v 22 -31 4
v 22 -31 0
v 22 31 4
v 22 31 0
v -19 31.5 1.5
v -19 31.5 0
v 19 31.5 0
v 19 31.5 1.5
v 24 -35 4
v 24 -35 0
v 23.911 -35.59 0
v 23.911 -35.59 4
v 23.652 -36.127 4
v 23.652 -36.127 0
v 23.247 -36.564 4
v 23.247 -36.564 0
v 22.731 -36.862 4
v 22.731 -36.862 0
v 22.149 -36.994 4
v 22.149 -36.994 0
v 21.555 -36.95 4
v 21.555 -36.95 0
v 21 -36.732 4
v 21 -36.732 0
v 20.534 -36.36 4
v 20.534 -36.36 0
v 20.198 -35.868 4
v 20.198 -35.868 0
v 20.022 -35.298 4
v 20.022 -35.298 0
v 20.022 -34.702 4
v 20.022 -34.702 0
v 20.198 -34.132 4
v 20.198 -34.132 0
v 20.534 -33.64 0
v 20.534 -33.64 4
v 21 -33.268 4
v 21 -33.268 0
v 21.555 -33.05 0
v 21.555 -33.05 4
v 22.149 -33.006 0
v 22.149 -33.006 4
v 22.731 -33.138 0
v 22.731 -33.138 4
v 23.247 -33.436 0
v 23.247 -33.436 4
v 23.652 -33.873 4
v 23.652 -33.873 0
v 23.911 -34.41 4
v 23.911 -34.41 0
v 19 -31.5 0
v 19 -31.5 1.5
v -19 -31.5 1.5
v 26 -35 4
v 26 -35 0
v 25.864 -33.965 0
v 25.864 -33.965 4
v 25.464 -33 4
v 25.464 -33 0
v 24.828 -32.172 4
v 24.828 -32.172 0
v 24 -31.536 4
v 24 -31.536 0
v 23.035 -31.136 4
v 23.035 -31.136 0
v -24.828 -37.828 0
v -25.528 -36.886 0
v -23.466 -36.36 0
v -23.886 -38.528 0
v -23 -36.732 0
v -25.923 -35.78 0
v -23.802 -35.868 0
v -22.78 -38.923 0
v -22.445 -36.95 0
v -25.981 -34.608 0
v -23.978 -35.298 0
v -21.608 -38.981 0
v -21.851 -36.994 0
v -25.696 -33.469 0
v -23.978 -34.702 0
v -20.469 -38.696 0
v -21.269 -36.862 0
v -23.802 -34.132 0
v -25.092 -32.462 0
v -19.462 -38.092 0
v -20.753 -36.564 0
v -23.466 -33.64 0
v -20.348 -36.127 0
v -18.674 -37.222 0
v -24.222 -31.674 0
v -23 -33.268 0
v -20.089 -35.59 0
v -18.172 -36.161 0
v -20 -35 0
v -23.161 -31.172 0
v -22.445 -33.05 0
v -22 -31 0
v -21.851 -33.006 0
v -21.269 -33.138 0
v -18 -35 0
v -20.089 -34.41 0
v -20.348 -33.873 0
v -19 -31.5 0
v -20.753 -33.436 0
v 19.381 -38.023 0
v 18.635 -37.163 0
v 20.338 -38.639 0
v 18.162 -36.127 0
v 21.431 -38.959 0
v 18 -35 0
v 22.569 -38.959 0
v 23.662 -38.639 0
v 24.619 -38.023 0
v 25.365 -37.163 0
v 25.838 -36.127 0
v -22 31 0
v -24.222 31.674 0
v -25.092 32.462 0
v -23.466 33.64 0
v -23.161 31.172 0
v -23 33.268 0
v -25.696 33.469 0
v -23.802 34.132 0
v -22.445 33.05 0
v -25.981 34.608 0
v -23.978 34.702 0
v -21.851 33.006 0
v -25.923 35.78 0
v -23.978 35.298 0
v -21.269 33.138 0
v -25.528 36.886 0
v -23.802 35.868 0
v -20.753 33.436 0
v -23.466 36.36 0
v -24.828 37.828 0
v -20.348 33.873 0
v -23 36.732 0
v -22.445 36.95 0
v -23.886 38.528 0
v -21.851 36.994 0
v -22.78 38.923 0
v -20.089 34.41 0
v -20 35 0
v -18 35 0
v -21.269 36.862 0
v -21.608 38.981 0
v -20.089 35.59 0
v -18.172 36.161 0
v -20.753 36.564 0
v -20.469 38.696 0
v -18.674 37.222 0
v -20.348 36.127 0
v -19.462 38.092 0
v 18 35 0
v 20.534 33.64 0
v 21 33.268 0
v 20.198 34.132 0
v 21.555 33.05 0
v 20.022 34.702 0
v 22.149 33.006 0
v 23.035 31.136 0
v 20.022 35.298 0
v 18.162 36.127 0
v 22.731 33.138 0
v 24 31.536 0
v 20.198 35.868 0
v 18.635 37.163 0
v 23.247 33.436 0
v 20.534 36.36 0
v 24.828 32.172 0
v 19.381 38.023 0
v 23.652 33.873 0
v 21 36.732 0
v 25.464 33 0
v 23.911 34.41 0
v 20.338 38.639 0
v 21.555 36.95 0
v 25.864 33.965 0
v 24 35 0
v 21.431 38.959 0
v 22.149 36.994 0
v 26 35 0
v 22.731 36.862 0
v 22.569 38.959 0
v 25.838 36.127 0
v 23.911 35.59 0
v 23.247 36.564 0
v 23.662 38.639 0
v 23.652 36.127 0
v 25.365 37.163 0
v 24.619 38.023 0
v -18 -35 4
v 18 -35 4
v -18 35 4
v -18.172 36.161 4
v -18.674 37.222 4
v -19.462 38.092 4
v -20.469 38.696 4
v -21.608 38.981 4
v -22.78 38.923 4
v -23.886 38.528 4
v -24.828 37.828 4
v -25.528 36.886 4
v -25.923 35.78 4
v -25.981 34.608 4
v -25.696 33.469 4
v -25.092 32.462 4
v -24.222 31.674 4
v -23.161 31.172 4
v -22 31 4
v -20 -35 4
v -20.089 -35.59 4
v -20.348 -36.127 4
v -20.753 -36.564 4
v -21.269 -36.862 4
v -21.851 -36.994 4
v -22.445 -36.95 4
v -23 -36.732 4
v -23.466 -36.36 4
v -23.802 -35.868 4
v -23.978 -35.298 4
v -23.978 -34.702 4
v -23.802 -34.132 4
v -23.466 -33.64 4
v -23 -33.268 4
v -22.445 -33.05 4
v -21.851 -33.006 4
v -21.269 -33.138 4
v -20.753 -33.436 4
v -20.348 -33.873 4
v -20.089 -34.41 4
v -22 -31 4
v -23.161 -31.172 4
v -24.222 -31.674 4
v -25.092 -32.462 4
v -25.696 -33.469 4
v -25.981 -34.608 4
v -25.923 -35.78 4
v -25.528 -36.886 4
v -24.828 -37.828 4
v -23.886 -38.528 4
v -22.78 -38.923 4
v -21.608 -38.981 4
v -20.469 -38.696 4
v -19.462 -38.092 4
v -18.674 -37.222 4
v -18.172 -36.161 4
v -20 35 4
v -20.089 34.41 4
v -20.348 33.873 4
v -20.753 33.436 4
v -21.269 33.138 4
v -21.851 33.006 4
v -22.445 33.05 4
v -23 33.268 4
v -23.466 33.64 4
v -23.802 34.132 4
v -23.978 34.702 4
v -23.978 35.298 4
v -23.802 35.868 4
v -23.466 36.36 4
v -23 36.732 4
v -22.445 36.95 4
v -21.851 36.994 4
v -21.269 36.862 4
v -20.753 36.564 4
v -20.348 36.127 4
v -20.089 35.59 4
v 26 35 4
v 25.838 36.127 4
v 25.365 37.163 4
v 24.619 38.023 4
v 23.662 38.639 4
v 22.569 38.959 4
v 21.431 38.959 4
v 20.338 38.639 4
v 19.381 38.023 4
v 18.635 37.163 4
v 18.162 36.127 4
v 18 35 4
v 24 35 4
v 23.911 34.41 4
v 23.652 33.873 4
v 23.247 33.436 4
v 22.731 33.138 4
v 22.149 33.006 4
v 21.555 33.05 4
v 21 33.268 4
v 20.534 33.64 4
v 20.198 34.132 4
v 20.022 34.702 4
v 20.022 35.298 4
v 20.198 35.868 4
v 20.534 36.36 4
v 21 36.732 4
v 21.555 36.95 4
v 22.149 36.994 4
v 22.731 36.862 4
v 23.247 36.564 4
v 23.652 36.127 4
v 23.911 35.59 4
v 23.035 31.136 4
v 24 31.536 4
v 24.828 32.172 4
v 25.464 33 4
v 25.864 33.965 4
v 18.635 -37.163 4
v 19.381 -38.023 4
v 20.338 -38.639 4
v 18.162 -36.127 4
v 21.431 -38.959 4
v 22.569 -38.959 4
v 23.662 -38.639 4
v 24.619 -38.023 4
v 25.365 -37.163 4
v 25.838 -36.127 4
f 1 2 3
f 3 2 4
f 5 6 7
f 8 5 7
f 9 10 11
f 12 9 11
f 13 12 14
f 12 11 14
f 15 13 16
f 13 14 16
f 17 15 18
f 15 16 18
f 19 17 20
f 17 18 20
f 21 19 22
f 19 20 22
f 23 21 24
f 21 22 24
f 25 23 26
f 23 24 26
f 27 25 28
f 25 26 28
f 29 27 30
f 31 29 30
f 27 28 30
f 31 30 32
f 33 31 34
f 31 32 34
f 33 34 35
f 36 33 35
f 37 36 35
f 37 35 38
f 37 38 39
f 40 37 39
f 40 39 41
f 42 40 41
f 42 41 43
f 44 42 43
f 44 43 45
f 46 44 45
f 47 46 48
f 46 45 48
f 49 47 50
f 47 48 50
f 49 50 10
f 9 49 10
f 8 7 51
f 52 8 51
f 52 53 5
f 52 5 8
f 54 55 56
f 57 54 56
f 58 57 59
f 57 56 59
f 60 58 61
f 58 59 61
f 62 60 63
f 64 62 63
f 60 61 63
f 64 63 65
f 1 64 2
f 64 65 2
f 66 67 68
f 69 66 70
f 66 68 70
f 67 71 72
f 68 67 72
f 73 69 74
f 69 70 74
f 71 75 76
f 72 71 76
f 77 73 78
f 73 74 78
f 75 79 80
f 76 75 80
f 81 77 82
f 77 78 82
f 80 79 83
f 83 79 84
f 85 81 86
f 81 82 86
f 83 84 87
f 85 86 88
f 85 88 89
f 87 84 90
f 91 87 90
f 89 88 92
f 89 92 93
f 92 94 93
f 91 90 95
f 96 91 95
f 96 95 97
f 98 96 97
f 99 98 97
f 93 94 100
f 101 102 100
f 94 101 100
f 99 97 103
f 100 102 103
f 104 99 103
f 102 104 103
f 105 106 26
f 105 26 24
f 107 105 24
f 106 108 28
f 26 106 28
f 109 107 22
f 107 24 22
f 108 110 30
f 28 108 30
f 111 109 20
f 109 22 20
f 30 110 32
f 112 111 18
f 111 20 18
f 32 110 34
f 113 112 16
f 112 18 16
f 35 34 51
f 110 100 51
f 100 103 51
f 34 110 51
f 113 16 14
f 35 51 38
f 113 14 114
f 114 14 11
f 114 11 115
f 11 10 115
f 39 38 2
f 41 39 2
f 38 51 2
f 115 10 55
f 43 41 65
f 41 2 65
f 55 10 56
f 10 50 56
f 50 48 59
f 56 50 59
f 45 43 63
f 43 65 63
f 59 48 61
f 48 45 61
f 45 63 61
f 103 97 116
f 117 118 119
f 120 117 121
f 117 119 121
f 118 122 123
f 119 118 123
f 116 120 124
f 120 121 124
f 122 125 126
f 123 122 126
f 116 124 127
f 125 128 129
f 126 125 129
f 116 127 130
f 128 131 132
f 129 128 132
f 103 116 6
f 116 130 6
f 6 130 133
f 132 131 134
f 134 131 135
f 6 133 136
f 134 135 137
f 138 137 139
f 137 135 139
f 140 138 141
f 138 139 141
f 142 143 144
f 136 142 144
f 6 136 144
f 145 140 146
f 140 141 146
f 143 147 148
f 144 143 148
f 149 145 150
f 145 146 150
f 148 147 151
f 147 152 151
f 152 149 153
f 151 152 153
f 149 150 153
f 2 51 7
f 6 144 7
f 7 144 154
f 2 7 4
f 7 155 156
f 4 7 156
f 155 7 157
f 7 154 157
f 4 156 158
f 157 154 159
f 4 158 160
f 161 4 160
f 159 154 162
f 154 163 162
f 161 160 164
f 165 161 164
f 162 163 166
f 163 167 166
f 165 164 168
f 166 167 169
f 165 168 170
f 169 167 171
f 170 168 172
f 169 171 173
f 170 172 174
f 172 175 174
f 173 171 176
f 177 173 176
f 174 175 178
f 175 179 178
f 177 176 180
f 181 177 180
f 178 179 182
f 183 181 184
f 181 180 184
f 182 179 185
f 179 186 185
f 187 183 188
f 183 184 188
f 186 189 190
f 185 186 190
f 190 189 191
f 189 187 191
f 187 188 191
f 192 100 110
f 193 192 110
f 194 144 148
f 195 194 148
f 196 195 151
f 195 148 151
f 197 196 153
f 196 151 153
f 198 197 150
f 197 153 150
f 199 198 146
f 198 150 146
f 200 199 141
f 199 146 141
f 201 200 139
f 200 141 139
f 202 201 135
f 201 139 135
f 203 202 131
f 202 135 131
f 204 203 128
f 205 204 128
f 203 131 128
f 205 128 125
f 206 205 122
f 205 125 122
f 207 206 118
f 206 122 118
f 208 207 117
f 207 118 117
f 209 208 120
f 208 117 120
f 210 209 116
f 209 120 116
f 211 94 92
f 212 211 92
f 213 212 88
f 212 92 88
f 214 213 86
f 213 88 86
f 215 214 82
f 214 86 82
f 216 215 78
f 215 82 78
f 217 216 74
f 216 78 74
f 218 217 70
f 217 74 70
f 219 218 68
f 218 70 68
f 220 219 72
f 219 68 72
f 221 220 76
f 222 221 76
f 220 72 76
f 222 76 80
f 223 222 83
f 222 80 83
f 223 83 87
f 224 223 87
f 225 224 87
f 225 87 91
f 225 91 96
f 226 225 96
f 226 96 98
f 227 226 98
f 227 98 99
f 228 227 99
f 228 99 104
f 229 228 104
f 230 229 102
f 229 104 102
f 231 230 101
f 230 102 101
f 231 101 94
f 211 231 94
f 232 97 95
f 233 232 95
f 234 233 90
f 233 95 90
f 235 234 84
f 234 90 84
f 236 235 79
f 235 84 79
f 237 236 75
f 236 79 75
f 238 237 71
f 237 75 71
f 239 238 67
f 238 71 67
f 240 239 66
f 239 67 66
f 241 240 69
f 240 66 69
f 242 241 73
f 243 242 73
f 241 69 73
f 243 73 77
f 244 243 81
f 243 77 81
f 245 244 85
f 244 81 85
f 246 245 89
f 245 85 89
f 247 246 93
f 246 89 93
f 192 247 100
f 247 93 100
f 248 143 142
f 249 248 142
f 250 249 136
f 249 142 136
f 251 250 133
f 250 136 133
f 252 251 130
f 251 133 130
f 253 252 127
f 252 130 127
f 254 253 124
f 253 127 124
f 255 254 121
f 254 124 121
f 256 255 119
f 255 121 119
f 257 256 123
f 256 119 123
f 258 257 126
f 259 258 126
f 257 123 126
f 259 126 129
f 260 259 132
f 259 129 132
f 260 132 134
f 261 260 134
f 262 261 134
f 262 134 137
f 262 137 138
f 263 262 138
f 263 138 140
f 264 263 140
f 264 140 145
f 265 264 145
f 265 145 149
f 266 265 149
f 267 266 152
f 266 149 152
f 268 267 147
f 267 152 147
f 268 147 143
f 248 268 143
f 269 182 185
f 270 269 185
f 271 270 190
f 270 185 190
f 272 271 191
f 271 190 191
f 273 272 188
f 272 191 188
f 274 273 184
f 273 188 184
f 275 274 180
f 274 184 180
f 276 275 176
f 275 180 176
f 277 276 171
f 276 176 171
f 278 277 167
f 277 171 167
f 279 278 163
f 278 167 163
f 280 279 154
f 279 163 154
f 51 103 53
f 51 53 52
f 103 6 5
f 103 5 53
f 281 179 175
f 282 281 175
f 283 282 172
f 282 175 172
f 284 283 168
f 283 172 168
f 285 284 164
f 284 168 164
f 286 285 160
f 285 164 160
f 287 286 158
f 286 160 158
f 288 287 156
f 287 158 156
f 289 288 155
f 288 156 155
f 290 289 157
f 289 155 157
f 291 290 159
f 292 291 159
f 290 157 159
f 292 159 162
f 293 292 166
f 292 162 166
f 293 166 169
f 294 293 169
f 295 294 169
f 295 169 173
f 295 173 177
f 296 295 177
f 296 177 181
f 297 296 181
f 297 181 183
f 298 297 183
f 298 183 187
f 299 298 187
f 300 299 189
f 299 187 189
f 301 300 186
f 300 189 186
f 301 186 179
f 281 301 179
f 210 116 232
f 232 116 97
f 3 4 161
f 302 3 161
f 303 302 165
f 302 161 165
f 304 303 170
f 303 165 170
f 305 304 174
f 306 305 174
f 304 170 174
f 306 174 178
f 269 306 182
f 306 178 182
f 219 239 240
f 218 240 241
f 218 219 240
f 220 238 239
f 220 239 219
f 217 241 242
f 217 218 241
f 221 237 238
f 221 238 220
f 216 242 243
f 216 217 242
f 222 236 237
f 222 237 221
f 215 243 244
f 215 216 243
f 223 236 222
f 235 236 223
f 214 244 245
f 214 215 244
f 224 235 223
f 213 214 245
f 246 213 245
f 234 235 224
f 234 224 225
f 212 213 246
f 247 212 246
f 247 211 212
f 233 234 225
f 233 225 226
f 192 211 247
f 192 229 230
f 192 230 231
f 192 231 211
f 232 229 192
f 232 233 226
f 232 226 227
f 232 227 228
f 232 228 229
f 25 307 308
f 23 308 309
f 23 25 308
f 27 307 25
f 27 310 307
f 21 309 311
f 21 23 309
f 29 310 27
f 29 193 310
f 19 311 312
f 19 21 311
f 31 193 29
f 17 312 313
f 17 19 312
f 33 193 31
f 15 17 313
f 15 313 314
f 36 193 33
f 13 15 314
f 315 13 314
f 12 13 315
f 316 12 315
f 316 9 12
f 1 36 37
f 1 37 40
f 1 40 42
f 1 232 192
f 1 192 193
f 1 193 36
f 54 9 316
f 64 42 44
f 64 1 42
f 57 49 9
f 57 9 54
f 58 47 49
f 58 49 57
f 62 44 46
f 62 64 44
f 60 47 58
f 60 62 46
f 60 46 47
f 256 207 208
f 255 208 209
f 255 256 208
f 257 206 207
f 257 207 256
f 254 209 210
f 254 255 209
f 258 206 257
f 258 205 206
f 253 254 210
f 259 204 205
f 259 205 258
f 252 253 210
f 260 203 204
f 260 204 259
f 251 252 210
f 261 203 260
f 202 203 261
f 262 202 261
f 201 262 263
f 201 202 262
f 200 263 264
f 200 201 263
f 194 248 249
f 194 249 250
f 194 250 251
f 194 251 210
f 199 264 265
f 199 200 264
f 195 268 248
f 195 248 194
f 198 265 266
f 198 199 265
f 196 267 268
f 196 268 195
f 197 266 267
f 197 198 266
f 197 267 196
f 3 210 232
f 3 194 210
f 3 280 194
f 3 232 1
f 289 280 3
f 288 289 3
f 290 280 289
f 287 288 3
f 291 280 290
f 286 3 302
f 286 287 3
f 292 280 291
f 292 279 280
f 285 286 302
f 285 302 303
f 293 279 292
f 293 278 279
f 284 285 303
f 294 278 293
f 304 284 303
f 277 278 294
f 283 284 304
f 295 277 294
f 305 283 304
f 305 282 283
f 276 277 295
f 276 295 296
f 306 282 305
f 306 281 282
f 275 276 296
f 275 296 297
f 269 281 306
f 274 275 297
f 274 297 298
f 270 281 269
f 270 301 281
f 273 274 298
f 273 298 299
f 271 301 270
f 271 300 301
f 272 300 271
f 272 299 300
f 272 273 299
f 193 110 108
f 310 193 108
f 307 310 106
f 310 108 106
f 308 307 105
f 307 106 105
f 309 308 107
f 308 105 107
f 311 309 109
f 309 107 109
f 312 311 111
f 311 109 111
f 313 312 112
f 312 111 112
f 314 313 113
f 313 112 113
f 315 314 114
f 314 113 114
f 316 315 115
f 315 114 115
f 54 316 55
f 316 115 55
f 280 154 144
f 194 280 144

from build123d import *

# Parameters (mm, degrees)
F1_DEPTH = 4
F2_W     = 38
F2_H     = 63
F3_DEPTH = 1.5
F4_R     = 2
F5_DEPTH = 4


with BuildPart() as f1:
    # F0 (on Top) → F1 (new body)
    with BuildSketch(Plane.XY):
        with BuildLine():
            ThreePointArc((-22, 31), (-19.1715728753, 32.1715728753), (-18, 35))
            Line((-18, 35), (-22, 35))
            Line((-22, 35), (-22, 31))
        make_face()
        with BuildLine():
            Line((-22, 35), (-18, 35))
            ThreePointArc((-18, 35), (-24.8284271247, 37.8284271247), (-22, 31))
            Line((-22, 31), (-22, 35))
        make_face()
        with BuildLine():
            Line((18, 35), (-18, 35))
            ThreePointArc((-18, 35), (-19.1715728753, 32.1715728753), (-22, 31))
            Line((-22, 31), (-22, -31))
            ThreePointArc((-22, -31), (-19.1715728753, -32.1715728753), (-18, -35))
            Line((-18, -35), (18, -35))
            ThreePointArc((18, -35), (19.1715728753, -32.1715728753), (22, -31))
            Line((22, -31), (22, 31))
            ThreePointArc((22, 31), (19.1715728753, 32.1715728753), (18, 35))
        make_face()
        with BuildLine():
            ThreePointArc((26, 35), (22, 39), (18, 35))
            Line((18, 35), (22, 35))
            Line((22, 35), (22, 31))
            ThreePointArc((22, 31), (24.8284271247, 32.1715728753), (26, 35))
        make_face()
        with BuildLine():
            Line((22, 35), (18, 35))
            ThreePointArc((18, 35), (19.1715728753, 32.1715728753), (22, 31))
            Line((22, 31), (22, 35))
        make_face()
        with BuildLine():
            ThreePointArc((-18, -35), (-19.1715728753, -32.1715728753), (-22, -31))
            Line((-22, -31), (-22, -35))
            Line((-22, -35), (-18, -35))
        make_face()
        with BuildLine():
            Line((-22, -35), (-22, -31))
            ThreePointArc((-22, -31), (-24.8284271247, -37.8284271247), (-18, -35))
            Line((-18, -35), (-22, -35))
        make_face()
        with BuildLine():
            ThreePointArc((26, -35), (24.8284271247, -32.1715728753), (22, -31))
            Line((22, -31), (22, -35))
            Line((22, -35), (18, -35))
            ThreePointArc((18, -35), (22, -39), (26, -35))
        make_face()
        with BuildLine():
            Line((22, -35), (22, -31))
            ThreePointArc((22, -31), (19.1715728753, -32.1715728753), (18, -35))
            Line((18, -35), (22, -35))
        make_face()
    extrude(amount=F1_DEPTH)

    # F2 (on face) → F3 (cut)
    with BuildSketch(Plane(origin=(0, 0, 0), x_dir=(1, 0, 0), z_dir=(0, 0, -1))):
        Rectangle(F2_W, F2_H)
    extrude(amount=-F3_DEPTH, mode=Mode.SUBTRACT)

    # F4 (on face) → F5 (cut, through all)
    with BuildSketch(Plane(origin=(0, 0, 0), x_dir=(1, 0, 0), z_dir=(0, 0, -1))):
        with Locations((-22, 35)):
            Circle(F4_R)
        with Locations((22, 35)):
            Circle(F4_R)
        with Locations((-22, -35)):
            Circle(F4_R)
        with Locations((22, -35)):
            Circle(F4_R)
    extrude(amount=-F5_DEPTH, mode=Mode.SUBTRACT)


solid = f1.part
